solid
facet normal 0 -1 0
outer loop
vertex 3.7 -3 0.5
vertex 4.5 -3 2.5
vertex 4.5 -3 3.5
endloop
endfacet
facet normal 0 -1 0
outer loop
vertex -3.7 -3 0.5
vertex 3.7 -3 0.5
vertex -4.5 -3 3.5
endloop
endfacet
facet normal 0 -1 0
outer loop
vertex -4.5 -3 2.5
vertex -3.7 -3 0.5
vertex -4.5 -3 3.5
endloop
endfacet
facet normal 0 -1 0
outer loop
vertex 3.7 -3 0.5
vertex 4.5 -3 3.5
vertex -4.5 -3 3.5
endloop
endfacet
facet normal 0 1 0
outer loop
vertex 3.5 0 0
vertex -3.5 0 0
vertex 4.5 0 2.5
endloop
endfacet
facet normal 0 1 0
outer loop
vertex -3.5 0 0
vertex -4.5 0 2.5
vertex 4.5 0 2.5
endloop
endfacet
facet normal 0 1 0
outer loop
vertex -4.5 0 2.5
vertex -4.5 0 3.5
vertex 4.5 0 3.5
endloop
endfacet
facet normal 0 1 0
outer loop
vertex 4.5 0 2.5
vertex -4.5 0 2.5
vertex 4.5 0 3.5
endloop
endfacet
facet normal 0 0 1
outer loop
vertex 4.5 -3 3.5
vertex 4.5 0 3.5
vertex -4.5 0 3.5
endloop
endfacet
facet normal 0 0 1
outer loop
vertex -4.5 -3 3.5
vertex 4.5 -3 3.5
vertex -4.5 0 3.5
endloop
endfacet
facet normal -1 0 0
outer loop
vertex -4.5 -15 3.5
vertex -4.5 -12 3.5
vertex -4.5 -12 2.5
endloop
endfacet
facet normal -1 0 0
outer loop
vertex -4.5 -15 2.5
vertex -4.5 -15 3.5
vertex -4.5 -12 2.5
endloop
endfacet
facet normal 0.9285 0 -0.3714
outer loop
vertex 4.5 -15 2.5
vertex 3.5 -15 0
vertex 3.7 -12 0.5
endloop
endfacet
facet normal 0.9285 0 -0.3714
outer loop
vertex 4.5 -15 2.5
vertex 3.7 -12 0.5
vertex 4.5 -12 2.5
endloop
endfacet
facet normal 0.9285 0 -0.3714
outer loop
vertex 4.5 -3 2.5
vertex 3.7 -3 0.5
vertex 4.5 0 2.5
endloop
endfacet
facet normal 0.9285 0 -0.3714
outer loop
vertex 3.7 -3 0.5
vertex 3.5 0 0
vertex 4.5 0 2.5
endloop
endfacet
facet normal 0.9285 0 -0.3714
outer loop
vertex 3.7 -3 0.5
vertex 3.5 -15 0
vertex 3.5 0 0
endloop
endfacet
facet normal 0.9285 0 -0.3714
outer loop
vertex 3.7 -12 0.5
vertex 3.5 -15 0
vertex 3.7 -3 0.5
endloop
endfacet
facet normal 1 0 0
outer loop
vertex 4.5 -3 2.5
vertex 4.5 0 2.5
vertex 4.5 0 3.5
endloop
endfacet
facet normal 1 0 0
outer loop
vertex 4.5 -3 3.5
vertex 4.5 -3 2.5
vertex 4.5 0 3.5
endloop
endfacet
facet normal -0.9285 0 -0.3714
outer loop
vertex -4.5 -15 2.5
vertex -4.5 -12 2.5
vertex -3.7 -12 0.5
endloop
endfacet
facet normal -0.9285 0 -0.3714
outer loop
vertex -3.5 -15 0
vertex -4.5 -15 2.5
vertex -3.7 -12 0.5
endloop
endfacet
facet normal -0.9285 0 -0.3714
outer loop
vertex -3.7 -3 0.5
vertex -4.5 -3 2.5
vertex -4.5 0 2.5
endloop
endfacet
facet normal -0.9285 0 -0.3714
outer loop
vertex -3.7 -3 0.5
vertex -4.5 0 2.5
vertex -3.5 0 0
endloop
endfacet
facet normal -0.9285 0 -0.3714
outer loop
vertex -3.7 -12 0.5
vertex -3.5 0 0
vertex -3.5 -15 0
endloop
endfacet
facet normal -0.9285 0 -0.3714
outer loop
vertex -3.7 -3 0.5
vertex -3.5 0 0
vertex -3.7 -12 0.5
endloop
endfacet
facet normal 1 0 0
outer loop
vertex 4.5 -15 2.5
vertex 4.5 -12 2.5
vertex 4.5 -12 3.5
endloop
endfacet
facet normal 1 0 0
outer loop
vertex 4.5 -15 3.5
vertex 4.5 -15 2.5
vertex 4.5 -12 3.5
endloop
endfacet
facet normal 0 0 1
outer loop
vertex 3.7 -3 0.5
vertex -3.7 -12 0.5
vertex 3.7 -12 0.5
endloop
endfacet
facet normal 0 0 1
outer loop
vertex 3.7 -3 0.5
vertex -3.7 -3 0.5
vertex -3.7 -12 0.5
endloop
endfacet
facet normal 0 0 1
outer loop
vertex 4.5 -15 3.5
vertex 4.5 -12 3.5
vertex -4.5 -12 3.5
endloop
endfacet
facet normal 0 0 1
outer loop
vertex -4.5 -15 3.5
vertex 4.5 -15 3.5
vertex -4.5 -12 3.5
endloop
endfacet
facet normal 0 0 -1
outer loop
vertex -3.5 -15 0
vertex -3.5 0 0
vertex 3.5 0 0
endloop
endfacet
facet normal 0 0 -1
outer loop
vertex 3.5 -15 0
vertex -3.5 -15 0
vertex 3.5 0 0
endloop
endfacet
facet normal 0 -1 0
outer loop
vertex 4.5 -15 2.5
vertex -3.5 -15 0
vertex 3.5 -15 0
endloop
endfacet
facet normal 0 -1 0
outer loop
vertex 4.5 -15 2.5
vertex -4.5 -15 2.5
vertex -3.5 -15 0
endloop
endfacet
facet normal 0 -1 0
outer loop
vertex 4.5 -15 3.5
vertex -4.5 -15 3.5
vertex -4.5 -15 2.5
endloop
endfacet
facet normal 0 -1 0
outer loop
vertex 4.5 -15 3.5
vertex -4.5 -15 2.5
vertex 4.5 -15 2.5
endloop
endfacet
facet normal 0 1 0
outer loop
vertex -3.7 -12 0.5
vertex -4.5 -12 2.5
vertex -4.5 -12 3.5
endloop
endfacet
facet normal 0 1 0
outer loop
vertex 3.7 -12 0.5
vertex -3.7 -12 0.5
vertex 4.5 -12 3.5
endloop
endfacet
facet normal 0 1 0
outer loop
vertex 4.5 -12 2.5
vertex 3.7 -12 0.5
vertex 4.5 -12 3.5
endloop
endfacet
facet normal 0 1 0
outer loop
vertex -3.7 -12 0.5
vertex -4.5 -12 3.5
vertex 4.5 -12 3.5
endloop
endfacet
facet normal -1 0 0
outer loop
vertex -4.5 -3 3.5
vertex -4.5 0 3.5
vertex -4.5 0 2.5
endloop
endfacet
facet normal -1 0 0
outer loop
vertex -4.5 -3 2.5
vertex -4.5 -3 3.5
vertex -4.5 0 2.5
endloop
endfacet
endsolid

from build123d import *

# Parameters (mm, degrees)
F1_DEPTH = 15
F3_DEPTH = 3


with BuildPart() as f1:
    # F0 (on Front) → F1 (new body)
    with BuildSketch(Plane.XZ):
        Polygon((-3.5, 0), (0, 0), (3.5, 0), (4.5, 2.5), (4.5, 3.5), (0, 3.5), (-4.5, 3.5), (-4.5, 2.5), align=None)
    extrude(amount=F1_DEPTH)

    # F2 (on face) → F3 (cut)
    with BuildSketch(Plane.XY.offset(3.5)):
        Polygon((4.5, -12), (4.5, -7.5), (4.5, -3), (-4.5, -3), (-4.5, -7.5), (-4.5, -12), align=None)
    extrude(amount=-F3_DEPTH, mode=Mode.SUBTRACT)


solid = f1.part
